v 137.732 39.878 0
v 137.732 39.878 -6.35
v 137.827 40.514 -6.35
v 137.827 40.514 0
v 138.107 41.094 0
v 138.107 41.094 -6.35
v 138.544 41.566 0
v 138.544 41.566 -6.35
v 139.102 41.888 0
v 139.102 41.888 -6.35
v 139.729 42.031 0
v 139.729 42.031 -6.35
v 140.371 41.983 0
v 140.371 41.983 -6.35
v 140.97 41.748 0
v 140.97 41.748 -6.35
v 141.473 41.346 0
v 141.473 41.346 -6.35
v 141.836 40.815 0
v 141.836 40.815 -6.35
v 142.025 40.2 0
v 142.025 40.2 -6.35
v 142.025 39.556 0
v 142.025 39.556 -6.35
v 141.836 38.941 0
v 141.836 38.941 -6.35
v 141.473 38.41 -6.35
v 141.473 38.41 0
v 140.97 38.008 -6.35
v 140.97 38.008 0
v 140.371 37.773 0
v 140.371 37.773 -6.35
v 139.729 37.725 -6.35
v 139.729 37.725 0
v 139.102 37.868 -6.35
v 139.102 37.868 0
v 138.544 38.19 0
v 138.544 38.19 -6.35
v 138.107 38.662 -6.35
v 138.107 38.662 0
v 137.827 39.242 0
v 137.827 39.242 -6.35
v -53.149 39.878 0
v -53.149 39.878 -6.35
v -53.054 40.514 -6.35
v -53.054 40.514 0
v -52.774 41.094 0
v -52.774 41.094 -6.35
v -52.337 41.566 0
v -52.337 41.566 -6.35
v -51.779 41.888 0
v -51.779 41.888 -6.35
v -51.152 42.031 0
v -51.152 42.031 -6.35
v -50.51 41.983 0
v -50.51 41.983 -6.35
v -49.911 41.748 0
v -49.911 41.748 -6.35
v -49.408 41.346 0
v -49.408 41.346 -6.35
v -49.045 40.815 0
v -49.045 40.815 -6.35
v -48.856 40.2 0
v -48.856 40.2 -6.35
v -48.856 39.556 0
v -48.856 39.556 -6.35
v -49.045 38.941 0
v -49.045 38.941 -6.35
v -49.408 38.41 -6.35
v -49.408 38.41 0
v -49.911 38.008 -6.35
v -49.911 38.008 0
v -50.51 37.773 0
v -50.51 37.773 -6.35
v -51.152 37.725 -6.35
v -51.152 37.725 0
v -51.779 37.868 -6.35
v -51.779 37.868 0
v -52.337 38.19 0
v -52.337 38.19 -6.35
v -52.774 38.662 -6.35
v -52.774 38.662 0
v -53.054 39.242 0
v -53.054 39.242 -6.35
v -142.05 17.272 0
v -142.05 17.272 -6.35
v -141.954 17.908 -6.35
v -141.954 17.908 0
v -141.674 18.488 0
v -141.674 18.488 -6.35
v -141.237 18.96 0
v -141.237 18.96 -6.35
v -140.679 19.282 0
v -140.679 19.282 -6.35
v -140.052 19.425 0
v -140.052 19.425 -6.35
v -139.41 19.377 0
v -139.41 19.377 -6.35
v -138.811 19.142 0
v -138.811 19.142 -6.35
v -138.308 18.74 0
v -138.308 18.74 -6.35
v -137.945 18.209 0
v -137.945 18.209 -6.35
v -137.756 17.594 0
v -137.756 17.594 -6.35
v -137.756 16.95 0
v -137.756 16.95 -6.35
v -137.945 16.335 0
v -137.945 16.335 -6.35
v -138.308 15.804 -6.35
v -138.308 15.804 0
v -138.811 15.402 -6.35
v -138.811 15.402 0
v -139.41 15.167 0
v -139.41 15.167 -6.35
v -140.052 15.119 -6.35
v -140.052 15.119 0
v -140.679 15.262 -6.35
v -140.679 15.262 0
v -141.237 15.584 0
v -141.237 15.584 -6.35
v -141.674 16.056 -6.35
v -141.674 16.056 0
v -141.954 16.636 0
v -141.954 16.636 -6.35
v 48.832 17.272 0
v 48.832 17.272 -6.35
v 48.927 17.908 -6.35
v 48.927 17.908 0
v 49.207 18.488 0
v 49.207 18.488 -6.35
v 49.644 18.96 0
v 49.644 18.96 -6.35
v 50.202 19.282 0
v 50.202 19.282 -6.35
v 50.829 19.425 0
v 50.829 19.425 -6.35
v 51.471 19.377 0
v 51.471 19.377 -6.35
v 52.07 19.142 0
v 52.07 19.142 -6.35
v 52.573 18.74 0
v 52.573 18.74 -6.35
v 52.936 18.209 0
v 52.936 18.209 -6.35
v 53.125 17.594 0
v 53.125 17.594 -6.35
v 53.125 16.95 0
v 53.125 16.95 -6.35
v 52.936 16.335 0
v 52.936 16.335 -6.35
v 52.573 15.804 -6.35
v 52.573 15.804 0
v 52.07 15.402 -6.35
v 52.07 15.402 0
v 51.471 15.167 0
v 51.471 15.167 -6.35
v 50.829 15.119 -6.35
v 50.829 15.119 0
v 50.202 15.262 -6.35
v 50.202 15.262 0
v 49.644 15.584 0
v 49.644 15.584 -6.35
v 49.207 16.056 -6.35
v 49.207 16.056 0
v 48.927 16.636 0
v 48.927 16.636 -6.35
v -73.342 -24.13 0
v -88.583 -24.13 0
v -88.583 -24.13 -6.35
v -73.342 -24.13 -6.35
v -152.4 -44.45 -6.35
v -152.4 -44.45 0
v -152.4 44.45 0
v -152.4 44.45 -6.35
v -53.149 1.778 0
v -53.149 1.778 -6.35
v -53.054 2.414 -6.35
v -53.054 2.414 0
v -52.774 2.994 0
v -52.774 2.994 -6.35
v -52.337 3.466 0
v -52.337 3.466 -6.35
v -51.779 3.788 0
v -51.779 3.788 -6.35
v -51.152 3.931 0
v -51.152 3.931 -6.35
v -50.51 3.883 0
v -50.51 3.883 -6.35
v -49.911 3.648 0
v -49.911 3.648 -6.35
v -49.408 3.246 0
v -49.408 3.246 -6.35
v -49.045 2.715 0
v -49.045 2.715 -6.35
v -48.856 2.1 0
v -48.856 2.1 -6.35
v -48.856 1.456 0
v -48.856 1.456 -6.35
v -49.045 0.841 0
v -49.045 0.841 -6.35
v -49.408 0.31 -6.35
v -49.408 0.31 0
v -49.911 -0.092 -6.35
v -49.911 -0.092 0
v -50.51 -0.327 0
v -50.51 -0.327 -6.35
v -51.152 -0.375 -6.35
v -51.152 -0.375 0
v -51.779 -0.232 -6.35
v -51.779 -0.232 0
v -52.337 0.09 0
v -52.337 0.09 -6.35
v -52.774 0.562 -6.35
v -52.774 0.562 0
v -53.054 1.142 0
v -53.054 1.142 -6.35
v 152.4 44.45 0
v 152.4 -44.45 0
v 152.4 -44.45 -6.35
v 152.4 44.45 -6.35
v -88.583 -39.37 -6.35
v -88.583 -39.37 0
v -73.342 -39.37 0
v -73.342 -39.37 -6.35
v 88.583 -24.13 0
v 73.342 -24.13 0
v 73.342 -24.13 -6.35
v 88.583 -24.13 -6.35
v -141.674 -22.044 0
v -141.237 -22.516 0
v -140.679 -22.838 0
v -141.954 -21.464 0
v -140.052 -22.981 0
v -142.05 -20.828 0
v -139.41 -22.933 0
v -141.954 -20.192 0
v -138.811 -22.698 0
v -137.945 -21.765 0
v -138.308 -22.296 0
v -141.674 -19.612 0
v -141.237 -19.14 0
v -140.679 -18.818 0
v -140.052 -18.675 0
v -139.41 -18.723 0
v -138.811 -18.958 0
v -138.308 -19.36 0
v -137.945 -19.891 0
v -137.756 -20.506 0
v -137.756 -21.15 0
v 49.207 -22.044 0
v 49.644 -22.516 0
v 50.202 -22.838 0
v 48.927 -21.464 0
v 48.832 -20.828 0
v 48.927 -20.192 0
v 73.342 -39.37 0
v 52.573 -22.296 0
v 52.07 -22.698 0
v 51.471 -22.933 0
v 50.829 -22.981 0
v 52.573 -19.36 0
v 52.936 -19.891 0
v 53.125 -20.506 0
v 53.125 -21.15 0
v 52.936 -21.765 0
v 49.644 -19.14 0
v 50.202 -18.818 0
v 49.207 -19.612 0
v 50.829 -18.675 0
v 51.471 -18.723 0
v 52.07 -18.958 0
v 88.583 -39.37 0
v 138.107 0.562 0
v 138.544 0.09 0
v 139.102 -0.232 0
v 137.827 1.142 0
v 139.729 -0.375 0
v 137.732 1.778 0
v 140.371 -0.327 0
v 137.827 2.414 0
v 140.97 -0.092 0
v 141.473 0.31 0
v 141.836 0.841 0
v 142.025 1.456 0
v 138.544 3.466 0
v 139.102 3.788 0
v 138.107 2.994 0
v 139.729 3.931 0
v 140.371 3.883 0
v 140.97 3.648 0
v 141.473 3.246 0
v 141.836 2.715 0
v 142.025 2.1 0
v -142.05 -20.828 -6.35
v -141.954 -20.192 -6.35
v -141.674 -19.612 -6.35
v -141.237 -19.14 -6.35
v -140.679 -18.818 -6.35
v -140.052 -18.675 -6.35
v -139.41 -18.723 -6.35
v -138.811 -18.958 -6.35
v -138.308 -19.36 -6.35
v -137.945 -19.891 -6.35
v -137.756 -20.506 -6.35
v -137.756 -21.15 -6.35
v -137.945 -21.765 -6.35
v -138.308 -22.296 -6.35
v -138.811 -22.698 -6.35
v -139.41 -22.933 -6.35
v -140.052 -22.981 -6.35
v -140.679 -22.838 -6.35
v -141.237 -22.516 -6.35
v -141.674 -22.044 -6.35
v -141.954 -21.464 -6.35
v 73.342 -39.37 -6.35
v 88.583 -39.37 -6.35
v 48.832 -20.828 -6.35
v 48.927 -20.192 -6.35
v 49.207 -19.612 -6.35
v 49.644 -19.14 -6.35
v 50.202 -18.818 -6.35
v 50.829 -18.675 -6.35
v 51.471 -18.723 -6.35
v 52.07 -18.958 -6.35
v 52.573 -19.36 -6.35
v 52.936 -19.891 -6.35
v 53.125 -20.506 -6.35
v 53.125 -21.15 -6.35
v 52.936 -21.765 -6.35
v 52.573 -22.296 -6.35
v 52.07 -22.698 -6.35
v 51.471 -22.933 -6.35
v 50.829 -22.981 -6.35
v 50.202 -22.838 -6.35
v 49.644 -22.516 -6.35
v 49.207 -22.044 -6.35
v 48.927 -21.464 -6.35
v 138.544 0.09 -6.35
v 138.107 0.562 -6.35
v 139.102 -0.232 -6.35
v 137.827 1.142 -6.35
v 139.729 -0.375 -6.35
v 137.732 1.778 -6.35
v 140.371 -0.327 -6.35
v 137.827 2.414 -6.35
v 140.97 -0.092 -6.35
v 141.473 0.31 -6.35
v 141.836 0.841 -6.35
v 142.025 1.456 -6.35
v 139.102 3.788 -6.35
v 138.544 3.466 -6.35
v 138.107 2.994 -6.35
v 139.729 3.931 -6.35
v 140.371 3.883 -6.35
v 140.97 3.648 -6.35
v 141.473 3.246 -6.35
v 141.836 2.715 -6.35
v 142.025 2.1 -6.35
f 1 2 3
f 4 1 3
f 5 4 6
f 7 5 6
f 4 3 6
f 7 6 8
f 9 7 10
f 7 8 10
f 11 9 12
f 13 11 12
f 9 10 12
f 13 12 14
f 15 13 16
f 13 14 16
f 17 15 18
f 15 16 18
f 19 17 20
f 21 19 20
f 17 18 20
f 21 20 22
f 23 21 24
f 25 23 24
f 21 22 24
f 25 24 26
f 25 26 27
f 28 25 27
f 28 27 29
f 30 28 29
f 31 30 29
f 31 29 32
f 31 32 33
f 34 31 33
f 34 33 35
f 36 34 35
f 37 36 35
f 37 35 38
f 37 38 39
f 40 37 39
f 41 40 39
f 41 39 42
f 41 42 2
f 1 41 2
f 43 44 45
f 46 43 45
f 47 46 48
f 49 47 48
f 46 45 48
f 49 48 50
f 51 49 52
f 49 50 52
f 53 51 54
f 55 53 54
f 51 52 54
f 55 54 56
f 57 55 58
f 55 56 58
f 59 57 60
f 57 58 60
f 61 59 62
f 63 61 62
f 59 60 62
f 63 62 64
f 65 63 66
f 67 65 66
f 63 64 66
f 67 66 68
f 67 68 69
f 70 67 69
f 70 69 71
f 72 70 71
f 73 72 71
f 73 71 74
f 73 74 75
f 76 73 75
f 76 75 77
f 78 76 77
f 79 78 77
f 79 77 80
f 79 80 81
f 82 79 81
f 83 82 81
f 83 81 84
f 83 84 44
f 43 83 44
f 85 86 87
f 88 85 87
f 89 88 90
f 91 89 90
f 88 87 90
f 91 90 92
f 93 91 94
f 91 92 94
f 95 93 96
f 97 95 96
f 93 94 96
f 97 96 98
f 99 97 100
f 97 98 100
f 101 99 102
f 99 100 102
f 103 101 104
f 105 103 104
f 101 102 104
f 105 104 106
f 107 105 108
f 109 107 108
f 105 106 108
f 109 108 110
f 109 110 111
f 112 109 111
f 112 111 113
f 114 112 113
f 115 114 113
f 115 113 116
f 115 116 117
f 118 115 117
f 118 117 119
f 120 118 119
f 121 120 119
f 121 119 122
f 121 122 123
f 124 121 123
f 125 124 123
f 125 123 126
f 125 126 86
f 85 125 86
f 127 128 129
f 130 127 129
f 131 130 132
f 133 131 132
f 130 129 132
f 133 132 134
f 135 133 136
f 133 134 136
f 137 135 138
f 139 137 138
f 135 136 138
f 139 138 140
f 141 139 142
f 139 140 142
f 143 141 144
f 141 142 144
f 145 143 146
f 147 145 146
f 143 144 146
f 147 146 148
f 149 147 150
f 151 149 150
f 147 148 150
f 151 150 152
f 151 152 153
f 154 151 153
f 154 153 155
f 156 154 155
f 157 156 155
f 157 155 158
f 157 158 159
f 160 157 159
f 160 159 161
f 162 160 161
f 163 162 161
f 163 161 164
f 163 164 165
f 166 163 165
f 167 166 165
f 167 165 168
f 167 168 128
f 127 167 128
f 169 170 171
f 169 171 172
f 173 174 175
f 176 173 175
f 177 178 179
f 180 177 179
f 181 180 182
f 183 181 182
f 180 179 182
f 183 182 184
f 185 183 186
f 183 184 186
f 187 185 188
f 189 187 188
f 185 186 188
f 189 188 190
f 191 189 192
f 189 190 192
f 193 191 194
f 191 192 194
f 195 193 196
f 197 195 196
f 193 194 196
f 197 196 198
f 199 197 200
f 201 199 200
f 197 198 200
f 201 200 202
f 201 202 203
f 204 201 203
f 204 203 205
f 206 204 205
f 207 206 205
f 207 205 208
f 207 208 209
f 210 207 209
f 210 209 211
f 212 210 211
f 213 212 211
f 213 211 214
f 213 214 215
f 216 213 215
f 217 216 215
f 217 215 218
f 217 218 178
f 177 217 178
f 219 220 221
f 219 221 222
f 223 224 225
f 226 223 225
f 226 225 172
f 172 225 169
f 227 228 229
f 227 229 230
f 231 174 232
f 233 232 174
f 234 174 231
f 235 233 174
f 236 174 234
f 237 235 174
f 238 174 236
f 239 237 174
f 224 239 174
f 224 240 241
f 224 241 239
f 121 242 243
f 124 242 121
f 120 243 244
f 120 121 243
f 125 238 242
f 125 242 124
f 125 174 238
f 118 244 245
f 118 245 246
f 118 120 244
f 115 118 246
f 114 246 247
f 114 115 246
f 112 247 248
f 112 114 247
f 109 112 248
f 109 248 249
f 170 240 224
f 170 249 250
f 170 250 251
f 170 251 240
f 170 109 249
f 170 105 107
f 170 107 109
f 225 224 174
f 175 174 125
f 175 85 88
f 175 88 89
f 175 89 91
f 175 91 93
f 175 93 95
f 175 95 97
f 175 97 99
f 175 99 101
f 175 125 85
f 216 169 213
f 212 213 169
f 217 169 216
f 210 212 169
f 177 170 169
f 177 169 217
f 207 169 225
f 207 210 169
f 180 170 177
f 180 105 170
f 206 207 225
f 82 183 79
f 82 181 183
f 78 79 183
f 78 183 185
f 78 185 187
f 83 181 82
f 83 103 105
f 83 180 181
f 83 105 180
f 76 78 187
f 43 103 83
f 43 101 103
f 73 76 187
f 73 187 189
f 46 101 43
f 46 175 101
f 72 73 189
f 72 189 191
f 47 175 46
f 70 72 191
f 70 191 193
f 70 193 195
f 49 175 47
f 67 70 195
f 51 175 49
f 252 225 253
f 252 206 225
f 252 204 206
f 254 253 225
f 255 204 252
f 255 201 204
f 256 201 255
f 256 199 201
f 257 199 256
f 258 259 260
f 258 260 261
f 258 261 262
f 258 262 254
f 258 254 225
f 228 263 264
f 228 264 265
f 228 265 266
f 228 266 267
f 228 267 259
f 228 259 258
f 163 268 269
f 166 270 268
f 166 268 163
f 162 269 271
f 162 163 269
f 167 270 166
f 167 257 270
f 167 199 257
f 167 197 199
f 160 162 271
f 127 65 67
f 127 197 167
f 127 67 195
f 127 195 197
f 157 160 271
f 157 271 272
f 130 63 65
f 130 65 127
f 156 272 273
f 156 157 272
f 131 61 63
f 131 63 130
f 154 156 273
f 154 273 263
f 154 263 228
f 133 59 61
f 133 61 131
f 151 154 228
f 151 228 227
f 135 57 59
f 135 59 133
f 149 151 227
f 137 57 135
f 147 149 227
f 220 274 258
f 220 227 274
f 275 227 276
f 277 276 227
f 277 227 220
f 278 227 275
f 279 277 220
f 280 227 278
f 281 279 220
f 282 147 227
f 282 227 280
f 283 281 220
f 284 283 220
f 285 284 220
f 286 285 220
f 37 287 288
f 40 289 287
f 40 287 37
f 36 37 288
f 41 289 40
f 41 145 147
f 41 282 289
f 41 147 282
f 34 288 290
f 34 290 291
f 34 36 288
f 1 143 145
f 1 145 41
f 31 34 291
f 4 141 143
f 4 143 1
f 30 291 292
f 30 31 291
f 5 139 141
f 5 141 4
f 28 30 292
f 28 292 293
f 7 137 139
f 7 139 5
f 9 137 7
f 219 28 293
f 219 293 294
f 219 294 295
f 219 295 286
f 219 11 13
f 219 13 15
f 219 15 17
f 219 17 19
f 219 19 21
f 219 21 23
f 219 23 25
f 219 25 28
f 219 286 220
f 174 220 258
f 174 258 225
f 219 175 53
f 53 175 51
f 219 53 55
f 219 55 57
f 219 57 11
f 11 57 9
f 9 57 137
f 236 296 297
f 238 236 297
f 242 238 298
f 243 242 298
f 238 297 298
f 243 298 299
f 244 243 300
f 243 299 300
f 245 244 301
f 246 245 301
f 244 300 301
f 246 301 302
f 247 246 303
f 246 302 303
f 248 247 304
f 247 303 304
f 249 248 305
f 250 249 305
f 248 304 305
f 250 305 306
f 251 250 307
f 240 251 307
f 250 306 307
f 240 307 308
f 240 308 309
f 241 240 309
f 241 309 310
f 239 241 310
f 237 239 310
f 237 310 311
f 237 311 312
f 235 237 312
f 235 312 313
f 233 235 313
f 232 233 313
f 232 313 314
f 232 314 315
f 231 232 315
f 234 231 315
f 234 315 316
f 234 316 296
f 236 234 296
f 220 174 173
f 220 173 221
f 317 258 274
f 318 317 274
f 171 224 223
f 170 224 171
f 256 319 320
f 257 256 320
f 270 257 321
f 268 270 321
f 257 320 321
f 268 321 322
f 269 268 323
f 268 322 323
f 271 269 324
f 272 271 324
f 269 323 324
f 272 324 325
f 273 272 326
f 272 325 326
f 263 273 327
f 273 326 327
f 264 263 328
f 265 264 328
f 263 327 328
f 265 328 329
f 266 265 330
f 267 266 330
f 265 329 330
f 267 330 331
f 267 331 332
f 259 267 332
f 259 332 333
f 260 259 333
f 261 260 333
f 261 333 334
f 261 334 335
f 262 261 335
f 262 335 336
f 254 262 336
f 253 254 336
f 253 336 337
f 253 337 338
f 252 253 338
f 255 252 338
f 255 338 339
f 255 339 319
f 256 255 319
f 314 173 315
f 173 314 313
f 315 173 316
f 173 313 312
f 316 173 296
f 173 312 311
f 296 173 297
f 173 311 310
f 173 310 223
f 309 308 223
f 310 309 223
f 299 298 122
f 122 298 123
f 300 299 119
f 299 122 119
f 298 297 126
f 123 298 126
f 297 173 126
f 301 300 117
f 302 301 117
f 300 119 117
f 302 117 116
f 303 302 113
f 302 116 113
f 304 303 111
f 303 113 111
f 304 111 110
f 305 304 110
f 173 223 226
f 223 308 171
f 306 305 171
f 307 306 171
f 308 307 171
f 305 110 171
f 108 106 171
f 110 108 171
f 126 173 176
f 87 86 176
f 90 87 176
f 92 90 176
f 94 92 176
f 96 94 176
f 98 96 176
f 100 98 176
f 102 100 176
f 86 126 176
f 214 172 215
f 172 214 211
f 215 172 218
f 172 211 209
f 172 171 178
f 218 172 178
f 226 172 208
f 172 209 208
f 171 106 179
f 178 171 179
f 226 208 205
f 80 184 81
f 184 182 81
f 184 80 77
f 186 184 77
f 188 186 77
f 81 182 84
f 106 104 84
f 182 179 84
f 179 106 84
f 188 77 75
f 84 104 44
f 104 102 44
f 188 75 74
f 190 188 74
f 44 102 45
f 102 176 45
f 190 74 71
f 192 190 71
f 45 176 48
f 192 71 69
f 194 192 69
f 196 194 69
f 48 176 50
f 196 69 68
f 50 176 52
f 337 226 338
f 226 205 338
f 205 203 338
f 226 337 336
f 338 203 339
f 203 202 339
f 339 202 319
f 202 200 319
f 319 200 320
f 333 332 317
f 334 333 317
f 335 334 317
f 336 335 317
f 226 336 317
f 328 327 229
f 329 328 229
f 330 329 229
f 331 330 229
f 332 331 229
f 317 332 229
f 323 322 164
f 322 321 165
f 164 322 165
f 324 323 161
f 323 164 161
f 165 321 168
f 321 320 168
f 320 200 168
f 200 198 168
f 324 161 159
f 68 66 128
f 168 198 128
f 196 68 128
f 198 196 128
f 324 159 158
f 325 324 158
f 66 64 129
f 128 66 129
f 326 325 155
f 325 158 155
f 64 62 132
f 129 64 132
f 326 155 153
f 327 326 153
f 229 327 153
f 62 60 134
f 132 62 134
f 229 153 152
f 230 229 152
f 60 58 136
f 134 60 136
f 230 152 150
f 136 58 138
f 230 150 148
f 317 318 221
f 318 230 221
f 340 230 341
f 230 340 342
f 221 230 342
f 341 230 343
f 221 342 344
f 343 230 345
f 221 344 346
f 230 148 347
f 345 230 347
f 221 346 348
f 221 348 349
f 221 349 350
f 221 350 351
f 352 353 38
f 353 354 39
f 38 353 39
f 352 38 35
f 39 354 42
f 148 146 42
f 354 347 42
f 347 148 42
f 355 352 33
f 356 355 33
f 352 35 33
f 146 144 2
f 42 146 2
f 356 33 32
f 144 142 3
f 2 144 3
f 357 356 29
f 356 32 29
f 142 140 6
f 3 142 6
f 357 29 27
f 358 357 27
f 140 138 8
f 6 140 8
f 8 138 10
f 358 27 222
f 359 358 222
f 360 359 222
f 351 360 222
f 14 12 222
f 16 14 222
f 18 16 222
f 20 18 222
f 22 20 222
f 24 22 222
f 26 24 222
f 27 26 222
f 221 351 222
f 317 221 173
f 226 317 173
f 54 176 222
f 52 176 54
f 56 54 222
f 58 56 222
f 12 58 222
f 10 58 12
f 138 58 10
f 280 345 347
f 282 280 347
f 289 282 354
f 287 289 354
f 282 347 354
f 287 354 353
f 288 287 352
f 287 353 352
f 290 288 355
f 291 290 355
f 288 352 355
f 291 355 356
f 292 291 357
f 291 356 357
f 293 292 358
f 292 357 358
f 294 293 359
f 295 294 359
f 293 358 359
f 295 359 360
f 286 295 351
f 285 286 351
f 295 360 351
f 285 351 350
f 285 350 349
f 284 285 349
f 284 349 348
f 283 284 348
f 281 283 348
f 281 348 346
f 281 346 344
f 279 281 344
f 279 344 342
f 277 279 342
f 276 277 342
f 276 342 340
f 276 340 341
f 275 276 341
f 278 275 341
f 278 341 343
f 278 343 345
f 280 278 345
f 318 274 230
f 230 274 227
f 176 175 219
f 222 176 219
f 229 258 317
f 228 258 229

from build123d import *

# Parameters (mm, degrees)
F0_W     = 304.8
F0_H     = 88.9
F1_DEPTH = 6.35
F2_W     = 15.24
F2_H     = 15.24
F3_DEPTH = 25.4
F5_D     = 4.318


with BuildPart() as f1:
    # F0 (on Top) → F1 (new body)
    with BuildSketch(Plane.XY):
        Rectangle(F0_W, F0_H)
    extrude(amount=-F1_DEPTH)

    # F2 (on face) → F3 (cut)
    with BuildSketch(Plane.XY):
        with Locations((-80.9625, -31.75)):
            Rectangle(F2_W, F2_H)
        with Locations((80.9625, -31.75)):
            Rectangle(F2_W, F2_H)
    extrude(amount=-F3_DEPTH, mode=Mode.SUBTRACT)

    # F5 (through all)
    with Locations(Plane.XY):
        with Locations((-50.9905, 39.878), (-139.8905, 17.272), (-50.9905, 1.778), (-139.8905, -20.828), (139.8905, 1.778), (139.8905, 39.878), (50.9905, 17.272), (50.9905, -20.828)):
            Hole(F5_D / 2)


solid = f1.part
